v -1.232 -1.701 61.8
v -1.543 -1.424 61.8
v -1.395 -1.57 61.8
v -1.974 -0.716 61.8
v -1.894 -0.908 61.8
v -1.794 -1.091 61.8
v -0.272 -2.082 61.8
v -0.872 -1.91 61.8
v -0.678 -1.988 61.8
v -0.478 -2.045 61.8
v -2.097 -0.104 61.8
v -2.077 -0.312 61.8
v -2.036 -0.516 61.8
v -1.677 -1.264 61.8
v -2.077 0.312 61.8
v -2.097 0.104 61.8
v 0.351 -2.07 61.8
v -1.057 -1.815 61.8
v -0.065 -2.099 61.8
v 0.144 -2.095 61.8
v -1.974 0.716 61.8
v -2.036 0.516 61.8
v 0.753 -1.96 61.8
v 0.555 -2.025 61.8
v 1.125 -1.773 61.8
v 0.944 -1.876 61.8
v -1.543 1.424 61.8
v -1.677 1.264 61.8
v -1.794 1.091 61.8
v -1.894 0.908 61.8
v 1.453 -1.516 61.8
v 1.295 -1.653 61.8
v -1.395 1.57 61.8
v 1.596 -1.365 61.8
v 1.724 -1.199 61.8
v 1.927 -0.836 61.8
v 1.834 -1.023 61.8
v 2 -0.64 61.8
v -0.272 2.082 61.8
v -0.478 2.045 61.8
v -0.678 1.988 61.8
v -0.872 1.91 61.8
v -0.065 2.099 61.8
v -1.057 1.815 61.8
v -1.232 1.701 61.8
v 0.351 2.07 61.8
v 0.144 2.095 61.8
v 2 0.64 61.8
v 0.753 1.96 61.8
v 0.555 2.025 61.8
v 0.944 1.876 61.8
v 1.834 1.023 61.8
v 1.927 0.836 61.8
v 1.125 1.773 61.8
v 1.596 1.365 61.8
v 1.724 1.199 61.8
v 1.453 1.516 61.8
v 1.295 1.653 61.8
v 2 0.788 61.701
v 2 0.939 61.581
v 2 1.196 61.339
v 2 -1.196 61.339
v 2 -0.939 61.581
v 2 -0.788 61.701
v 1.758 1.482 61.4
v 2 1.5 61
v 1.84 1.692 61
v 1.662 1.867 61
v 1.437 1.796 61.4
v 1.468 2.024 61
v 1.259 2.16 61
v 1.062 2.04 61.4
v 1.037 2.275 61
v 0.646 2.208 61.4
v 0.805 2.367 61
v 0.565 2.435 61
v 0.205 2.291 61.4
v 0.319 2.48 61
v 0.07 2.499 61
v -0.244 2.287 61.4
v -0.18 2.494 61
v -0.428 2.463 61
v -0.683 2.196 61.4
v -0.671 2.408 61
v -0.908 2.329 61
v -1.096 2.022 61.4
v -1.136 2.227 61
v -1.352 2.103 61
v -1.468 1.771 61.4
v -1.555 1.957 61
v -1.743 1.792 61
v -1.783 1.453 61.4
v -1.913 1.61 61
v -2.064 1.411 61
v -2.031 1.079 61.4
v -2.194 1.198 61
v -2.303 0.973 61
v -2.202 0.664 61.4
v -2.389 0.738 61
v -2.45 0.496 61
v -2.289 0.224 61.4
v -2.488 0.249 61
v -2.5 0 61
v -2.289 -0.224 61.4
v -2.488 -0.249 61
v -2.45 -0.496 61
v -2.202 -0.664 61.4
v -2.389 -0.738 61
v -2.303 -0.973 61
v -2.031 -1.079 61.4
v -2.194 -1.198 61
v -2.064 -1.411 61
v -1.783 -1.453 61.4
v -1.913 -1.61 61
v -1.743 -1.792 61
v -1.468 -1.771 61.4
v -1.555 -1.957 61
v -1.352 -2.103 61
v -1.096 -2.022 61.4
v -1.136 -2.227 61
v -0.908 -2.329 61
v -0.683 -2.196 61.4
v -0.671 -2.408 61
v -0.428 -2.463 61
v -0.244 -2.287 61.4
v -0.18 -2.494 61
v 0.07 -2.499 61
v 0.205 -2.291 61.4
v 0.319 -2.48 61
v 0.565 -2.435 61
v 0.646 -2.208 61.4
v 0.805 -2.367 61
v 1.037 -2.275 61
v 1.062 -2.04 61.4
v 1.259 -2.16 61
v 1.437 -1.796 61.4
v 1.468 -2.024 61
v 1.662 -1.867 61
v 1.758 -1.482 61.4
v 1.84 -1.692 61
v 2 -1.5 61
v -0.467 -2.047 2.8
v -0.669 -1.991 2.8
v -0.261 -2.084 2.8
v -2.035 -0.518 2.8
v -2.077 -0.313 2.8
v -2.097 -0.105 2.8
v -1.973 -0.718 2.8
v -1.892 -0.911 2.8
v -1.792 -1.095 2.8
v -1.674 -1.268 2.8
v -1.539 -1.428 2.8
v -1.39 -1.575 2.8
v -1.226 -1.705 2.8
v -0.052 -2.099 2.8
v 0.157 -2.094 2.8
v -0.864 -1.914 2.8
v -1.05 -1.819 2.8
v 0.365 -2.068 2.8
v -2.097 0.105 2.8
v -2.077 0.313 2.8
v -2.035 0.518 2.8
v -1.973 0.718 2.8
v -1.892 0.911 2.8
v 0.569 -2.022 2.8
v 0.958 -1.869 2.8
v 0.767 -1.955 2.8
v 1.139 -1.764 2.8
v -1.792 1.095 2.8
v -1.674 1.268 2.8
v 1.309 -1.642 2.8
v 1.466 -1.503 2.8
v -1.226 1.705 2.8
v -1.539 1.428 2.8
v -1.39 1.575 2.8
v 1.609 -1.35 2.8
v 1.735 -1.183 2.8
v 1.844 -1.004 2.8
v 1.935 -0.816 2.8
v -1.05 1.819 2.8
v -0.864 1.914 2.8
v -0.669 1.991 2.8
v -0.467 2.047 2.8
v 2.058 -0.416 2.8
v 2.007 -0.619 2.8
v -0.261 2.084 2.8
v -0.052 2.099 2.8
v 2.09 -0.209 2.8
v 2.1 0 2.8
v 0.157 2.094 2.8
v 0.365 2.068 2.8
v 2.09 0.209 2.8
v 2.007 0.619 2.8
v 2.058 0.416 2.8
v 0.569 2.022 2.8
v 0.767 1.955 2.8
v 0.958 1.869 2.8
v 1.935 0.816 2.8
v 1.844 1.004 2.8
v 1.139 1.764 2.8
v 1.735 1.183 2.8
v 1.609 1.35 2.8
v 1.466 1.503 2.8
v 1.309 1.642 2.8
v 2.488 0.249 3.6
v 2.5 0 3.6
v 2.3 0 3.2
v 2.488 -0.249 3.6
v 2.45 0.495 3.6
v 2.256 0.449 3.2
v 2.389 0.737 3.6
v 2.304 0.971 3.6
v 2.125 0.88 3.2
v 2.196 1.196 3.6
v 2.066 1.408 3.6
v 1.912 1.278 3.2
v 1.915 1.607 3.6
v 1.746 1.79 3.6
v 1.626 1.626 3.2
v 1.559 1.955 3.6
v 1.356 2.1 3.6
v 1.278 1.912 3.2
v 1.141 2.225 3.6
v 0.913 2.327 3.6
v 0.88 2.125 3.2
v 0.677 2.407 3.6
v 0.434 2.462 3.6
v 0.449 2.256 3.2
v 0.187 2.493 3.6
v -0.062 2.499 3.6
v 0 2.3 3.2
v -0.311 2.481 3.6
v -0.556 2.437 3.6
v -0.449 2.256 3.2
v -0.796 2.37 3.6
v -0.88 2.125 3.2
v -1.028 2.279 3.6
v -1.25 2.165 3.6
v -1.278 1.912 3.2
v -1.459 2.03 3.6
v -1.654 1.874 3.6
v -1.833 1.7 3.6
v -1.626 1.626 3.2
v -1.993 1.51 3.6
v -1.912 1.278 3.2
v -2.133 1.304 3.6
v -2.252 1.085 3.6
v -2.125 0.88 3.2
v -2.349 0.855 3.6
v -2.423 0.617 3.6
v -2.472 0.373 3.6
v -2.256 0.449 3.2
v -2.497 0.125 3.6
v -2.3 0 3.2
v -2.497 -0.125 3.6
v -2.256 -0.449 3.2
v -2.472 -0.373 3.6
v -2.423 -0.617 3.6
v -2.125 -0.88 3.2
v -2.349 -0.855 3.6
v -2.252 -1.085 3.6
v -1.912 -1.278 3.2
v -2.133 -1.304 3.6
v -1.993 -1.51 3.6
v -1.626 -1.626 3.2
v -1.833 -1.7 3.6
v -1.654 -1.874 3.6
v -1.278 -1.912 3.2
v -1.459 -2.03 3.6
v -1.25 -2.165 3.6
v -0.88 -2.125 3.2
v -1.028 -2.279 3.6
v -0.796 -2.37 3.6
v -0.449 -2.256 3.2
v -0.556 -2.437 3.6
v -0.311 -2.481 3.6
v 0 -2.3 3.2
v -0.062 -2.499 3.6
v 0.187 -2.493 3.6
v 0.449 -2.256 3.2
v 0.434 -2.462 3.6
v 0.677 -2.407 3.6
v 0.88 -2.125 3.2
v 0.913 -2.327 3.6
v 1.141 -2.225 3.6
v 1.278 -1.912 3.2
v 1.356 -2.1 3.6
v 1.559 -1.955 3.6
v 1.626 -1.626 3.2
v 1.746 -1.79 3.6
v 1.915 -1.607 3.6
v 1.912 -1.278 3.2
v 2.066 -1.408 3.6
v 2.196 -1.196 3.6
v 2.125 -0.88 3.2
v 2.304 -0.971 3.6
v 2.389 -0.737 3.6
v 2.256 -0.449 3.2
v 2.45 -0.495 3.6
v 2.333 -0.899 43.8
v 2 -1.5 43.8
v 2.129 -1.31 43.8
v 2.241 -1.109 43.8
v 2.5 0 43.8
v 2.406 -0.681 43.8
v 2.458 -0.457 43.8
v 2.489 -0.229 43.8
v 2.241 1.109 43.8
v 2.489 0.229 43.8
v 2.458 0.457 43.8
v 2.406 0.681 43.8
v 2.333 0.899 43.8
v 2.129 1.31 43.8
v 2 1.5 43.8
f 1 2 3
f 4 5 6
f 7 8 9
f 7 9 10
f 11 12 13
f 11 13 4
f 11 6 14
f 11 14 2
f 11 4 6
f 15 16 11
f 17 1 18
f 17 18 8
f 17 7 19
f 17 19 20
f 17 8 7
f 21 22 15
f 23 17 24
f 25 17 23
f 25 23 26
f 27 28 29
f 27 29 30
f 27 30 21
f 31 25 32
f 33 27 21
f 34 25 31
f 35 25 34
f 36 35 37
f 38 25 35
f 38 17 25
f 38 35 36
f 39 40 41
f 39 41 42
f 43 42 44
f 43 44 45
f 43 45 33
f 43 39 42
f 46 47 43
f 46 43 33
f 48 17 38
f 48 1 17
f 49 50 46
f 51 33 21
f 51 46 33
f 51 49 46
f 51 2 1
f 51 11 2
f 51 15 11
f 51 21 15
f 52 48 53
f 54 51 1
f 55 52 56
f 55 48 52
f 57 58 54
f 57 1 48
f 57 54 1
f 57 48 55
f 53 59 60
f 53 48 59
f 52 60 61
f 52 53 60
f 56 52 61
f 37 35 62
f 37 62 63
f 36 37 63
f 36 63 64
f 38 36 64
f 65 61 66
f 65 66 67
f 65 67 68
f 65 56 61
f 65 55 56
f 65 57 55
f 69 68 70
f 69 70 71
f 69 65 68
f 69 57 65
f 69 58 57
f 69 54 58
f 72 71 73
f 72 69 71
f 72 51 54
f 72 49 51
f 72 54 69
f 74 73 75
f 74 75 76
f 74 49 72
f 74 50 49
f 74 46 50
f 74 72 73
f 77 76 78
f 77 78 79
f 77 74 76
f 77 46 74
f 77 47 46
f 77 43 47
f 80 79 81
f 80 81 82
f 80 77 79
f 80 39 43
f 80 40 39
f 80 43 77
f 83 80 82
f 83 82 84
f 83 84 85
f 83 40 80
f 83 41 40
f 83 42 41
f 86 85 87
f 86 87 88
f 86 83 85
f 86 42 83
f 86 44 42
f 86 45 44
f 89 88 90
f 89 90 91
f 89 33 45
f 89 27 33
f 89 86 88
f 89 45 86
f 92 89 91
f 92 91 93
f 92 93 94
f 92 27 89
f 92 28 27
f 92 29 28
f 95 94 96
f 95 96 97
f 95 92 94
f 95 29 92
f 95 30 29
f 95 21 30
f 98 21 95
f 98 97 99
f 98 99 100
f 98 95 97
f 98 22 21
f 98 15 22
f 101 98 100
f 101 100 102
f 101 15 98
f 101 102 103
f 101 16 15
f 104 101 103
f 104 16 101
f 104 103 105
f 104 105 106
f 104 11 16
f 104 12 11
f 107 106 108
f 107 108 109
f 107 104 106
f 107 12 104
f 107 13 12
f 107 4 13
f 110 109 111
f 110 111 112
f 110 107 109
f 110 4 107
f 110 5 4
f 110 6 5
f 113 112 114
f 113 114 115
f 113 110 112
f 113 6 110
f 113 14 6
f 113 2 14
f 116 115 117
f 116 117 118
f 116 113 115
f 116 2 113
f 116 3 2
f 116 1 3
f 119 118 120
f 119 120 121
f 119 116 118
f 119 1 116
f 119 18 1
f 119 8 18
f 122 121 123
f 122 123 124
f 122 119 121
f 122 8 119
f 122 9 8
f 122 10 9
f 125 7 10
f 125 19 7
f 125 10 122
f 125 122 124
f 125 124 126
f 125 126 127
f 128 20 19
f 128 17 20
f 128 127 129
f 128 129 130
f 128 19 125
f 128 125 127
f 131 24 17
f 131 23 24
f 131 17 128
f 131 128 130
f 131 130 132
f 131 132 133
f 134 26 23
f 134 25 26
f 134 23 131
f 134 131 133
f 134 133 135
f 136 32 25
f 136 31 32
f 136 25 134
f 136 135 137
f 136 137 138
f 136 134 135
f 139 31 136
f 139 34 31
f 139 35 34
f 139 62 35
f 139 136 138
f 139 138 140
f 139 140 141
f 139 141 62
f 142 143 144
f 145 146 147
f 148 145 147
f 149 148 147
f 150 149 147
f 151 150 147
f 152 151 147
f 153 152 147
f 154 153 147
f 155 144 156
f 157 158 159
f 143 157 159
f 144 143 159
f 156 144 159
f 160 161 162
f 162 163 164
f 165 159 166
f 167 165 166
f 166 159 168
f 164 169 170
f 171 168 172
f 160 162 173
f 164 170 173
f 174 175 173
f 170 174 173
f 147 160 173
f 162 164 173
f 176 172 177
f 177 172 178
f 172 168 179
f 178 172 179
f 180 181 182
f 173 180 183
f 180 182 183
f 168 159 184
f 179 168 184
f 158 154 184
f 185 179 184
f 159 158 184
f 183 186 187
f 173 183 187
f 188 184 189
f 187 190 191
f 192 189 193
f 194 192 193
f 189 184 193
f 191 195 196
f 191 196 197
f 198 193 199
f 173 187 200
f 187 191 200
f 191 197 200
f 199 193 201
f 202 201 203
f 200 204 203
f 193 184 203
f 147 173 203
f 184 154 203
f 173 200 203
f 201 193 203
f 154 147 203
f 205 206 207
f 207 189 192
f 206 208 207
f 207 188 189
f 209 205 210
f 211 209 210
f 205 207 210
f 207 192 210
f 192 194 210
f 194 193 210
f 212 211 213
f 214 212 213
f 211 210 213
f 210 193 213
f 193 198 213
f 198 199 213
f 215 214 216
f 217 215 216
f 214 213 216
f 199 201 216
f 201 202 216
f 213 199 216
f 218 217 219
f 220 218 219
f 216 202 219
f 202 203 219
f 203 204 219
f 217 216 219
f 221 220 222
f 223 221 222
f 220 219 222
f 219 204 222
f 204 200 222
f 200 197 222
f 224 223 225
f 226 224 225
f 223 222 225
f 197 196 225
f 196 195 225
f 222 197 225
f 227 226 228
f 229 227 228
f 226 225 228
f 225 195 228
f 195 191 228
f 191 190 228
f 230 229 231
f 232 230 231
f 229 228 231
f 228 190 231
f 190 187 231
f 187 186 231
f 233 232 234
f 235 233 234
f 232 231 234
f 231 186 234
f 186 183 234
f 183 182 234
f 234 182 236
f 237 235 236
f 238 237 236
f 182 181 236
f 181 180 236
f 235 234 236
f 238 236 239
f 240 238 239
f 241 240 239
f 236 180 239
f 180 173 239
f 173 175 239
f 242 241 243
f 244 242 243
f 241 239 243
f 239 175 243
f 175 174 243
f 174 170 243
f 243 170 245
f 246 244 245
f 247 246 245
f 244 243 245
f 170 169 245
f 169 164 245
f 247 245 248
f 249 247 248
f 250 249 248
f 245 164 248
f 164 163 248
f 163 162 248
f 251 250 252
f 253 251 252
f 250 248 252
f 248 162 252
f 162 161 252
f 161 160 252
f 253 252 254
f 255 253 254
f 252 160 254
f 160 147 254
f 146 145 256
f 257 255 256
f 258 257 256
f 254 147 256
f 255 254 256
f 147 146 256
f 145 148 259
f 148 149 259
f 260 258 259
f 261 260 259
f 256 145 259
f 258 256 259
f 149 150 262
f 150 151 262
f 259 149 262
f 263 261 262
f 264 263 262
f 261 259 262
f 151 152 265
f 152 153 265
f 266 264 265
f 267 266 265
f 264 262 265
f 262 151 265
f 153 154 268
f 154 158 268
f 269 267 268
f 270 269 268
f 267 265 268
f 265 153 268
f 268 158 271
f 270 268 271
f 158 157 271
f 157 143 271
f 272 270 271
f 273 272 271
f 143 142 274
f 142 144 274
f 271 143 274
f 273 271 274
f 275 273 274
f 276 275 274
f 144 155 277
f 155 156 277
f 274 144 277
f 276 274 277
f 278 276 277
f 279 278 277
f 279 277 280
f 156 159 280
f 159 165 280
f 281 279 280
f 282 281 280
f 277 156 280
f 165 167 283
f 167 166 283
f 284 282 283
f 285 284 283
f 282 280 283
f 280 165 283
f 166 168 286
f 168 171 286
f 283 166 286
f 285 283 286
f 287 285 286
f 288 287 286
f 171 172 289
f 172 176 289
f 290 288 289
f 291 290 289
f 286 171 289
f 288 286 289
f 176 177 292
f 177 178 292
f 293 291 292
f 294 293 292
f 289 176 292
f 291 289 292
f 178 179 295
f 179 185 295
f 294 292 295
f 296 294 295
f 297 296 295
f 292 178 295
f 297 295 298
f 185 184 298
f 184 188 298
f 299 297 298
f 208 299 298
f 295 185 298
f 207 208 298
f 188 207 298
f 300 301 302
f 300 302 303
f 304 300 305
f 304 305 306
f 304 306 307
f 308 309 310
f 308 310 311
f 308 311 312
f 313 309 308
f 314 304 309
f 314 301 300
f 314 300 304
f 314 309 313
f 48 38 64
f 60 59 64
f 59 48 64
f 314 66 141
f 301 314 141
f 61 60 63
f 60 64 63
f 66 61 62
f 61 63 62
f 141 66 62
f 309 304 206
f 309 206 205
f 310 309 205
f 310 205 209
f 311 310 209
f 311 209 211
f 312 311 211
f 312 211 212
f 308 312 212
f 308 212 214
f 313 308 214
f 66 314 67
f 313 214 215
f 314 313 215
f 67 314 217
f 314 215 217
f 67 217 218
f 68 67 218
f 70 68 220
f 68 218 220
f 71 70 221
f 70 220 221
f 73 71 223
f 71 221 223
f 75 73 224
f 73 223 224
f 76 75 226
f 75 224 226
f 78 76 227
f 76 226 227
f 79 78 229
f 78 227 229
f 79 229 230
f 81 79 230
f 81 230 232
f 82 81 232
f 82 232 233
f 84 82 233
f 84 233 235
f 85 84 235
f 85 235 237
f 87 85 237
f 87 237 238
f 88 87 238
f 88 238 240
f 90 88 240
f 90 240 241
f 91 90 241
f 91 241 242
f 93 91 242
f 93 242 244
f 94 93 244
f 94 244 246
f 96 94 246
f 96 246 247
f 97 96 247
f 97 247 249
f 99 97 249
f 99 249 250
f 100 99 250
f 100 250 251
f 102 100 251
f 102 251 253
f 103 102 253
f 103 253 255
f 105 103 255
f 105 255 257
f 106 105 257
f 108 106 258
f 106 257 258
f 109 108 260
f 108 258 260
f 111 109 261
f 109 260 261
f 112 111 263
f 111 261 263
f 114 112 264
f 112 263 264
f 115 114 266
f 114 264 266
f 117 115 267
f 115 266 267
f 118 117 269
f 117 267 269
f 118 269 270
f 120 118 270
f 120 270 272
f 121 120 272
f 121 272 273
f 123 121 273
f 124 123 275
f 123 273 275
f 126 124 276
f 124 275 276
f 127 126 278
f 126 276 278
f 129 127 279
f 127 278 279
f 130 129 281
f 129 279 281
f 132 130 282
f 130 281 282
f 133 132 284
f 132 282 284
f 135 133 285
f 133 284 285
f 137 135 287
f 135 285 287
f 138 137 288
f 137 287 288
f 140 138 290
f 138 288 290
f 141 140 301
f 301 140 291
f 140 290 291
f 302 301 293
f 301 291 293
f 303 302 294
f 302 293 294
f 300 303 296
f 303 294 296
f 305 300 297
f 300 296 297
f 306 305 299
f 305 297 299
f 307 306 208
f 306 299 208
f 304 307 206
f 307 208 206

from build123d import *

# Parameters (mm, degrees)
SKETCH012_R      = 2.5
PAD006_DEPTH     = 59
POCKET003_DEPTH  = 18
CHAMFER002_SIZE2 = 0.4
CHAMFER002_SIZE  = 0.8


with BuildPart() as part:
    # Sketch012 → Pad006 (new body)
    with BuildSketch(Plane.XY):
        Circle(SKETCH012_R)
    extrude(amount=PAD006_DEPTH)

    # Sketch013 (on Face3 of Pad006) → Pocket003 (cut)
    with BuildSketch(Plane.XY.offset(59)):
        with BuildLine():
            ThreePointArc((2, -1.5), (2.5, 0), (2, 1.5))
            Line((2, 1.5), (2, -1.5))
        make_face()
    extrude(amount=-POCKET003_DEPTH, mode=Mode.SUBTRACT)

    # Chamfer002
    chamfer002_edges = [part.edges().sort_by_distance(p)[0] for p in [
        (-2.5, 0, 59),
        (-2.5, 0, 0),
    ]]
    chamfer002_side = part.faces().sort_by_distance((-2.5, 0, 29.5))[0]
    chamfer(chamfer002_edges, length=CHAMFER002_SIZE, length2=CHAMFER002_SIZE2, reference=chamfer002_side)


with BuildPart() as part_1:
    # Body003 placement: moved
    add(part.part.moved(Location((0, 0, 2.8))))


solid = part_1.part
